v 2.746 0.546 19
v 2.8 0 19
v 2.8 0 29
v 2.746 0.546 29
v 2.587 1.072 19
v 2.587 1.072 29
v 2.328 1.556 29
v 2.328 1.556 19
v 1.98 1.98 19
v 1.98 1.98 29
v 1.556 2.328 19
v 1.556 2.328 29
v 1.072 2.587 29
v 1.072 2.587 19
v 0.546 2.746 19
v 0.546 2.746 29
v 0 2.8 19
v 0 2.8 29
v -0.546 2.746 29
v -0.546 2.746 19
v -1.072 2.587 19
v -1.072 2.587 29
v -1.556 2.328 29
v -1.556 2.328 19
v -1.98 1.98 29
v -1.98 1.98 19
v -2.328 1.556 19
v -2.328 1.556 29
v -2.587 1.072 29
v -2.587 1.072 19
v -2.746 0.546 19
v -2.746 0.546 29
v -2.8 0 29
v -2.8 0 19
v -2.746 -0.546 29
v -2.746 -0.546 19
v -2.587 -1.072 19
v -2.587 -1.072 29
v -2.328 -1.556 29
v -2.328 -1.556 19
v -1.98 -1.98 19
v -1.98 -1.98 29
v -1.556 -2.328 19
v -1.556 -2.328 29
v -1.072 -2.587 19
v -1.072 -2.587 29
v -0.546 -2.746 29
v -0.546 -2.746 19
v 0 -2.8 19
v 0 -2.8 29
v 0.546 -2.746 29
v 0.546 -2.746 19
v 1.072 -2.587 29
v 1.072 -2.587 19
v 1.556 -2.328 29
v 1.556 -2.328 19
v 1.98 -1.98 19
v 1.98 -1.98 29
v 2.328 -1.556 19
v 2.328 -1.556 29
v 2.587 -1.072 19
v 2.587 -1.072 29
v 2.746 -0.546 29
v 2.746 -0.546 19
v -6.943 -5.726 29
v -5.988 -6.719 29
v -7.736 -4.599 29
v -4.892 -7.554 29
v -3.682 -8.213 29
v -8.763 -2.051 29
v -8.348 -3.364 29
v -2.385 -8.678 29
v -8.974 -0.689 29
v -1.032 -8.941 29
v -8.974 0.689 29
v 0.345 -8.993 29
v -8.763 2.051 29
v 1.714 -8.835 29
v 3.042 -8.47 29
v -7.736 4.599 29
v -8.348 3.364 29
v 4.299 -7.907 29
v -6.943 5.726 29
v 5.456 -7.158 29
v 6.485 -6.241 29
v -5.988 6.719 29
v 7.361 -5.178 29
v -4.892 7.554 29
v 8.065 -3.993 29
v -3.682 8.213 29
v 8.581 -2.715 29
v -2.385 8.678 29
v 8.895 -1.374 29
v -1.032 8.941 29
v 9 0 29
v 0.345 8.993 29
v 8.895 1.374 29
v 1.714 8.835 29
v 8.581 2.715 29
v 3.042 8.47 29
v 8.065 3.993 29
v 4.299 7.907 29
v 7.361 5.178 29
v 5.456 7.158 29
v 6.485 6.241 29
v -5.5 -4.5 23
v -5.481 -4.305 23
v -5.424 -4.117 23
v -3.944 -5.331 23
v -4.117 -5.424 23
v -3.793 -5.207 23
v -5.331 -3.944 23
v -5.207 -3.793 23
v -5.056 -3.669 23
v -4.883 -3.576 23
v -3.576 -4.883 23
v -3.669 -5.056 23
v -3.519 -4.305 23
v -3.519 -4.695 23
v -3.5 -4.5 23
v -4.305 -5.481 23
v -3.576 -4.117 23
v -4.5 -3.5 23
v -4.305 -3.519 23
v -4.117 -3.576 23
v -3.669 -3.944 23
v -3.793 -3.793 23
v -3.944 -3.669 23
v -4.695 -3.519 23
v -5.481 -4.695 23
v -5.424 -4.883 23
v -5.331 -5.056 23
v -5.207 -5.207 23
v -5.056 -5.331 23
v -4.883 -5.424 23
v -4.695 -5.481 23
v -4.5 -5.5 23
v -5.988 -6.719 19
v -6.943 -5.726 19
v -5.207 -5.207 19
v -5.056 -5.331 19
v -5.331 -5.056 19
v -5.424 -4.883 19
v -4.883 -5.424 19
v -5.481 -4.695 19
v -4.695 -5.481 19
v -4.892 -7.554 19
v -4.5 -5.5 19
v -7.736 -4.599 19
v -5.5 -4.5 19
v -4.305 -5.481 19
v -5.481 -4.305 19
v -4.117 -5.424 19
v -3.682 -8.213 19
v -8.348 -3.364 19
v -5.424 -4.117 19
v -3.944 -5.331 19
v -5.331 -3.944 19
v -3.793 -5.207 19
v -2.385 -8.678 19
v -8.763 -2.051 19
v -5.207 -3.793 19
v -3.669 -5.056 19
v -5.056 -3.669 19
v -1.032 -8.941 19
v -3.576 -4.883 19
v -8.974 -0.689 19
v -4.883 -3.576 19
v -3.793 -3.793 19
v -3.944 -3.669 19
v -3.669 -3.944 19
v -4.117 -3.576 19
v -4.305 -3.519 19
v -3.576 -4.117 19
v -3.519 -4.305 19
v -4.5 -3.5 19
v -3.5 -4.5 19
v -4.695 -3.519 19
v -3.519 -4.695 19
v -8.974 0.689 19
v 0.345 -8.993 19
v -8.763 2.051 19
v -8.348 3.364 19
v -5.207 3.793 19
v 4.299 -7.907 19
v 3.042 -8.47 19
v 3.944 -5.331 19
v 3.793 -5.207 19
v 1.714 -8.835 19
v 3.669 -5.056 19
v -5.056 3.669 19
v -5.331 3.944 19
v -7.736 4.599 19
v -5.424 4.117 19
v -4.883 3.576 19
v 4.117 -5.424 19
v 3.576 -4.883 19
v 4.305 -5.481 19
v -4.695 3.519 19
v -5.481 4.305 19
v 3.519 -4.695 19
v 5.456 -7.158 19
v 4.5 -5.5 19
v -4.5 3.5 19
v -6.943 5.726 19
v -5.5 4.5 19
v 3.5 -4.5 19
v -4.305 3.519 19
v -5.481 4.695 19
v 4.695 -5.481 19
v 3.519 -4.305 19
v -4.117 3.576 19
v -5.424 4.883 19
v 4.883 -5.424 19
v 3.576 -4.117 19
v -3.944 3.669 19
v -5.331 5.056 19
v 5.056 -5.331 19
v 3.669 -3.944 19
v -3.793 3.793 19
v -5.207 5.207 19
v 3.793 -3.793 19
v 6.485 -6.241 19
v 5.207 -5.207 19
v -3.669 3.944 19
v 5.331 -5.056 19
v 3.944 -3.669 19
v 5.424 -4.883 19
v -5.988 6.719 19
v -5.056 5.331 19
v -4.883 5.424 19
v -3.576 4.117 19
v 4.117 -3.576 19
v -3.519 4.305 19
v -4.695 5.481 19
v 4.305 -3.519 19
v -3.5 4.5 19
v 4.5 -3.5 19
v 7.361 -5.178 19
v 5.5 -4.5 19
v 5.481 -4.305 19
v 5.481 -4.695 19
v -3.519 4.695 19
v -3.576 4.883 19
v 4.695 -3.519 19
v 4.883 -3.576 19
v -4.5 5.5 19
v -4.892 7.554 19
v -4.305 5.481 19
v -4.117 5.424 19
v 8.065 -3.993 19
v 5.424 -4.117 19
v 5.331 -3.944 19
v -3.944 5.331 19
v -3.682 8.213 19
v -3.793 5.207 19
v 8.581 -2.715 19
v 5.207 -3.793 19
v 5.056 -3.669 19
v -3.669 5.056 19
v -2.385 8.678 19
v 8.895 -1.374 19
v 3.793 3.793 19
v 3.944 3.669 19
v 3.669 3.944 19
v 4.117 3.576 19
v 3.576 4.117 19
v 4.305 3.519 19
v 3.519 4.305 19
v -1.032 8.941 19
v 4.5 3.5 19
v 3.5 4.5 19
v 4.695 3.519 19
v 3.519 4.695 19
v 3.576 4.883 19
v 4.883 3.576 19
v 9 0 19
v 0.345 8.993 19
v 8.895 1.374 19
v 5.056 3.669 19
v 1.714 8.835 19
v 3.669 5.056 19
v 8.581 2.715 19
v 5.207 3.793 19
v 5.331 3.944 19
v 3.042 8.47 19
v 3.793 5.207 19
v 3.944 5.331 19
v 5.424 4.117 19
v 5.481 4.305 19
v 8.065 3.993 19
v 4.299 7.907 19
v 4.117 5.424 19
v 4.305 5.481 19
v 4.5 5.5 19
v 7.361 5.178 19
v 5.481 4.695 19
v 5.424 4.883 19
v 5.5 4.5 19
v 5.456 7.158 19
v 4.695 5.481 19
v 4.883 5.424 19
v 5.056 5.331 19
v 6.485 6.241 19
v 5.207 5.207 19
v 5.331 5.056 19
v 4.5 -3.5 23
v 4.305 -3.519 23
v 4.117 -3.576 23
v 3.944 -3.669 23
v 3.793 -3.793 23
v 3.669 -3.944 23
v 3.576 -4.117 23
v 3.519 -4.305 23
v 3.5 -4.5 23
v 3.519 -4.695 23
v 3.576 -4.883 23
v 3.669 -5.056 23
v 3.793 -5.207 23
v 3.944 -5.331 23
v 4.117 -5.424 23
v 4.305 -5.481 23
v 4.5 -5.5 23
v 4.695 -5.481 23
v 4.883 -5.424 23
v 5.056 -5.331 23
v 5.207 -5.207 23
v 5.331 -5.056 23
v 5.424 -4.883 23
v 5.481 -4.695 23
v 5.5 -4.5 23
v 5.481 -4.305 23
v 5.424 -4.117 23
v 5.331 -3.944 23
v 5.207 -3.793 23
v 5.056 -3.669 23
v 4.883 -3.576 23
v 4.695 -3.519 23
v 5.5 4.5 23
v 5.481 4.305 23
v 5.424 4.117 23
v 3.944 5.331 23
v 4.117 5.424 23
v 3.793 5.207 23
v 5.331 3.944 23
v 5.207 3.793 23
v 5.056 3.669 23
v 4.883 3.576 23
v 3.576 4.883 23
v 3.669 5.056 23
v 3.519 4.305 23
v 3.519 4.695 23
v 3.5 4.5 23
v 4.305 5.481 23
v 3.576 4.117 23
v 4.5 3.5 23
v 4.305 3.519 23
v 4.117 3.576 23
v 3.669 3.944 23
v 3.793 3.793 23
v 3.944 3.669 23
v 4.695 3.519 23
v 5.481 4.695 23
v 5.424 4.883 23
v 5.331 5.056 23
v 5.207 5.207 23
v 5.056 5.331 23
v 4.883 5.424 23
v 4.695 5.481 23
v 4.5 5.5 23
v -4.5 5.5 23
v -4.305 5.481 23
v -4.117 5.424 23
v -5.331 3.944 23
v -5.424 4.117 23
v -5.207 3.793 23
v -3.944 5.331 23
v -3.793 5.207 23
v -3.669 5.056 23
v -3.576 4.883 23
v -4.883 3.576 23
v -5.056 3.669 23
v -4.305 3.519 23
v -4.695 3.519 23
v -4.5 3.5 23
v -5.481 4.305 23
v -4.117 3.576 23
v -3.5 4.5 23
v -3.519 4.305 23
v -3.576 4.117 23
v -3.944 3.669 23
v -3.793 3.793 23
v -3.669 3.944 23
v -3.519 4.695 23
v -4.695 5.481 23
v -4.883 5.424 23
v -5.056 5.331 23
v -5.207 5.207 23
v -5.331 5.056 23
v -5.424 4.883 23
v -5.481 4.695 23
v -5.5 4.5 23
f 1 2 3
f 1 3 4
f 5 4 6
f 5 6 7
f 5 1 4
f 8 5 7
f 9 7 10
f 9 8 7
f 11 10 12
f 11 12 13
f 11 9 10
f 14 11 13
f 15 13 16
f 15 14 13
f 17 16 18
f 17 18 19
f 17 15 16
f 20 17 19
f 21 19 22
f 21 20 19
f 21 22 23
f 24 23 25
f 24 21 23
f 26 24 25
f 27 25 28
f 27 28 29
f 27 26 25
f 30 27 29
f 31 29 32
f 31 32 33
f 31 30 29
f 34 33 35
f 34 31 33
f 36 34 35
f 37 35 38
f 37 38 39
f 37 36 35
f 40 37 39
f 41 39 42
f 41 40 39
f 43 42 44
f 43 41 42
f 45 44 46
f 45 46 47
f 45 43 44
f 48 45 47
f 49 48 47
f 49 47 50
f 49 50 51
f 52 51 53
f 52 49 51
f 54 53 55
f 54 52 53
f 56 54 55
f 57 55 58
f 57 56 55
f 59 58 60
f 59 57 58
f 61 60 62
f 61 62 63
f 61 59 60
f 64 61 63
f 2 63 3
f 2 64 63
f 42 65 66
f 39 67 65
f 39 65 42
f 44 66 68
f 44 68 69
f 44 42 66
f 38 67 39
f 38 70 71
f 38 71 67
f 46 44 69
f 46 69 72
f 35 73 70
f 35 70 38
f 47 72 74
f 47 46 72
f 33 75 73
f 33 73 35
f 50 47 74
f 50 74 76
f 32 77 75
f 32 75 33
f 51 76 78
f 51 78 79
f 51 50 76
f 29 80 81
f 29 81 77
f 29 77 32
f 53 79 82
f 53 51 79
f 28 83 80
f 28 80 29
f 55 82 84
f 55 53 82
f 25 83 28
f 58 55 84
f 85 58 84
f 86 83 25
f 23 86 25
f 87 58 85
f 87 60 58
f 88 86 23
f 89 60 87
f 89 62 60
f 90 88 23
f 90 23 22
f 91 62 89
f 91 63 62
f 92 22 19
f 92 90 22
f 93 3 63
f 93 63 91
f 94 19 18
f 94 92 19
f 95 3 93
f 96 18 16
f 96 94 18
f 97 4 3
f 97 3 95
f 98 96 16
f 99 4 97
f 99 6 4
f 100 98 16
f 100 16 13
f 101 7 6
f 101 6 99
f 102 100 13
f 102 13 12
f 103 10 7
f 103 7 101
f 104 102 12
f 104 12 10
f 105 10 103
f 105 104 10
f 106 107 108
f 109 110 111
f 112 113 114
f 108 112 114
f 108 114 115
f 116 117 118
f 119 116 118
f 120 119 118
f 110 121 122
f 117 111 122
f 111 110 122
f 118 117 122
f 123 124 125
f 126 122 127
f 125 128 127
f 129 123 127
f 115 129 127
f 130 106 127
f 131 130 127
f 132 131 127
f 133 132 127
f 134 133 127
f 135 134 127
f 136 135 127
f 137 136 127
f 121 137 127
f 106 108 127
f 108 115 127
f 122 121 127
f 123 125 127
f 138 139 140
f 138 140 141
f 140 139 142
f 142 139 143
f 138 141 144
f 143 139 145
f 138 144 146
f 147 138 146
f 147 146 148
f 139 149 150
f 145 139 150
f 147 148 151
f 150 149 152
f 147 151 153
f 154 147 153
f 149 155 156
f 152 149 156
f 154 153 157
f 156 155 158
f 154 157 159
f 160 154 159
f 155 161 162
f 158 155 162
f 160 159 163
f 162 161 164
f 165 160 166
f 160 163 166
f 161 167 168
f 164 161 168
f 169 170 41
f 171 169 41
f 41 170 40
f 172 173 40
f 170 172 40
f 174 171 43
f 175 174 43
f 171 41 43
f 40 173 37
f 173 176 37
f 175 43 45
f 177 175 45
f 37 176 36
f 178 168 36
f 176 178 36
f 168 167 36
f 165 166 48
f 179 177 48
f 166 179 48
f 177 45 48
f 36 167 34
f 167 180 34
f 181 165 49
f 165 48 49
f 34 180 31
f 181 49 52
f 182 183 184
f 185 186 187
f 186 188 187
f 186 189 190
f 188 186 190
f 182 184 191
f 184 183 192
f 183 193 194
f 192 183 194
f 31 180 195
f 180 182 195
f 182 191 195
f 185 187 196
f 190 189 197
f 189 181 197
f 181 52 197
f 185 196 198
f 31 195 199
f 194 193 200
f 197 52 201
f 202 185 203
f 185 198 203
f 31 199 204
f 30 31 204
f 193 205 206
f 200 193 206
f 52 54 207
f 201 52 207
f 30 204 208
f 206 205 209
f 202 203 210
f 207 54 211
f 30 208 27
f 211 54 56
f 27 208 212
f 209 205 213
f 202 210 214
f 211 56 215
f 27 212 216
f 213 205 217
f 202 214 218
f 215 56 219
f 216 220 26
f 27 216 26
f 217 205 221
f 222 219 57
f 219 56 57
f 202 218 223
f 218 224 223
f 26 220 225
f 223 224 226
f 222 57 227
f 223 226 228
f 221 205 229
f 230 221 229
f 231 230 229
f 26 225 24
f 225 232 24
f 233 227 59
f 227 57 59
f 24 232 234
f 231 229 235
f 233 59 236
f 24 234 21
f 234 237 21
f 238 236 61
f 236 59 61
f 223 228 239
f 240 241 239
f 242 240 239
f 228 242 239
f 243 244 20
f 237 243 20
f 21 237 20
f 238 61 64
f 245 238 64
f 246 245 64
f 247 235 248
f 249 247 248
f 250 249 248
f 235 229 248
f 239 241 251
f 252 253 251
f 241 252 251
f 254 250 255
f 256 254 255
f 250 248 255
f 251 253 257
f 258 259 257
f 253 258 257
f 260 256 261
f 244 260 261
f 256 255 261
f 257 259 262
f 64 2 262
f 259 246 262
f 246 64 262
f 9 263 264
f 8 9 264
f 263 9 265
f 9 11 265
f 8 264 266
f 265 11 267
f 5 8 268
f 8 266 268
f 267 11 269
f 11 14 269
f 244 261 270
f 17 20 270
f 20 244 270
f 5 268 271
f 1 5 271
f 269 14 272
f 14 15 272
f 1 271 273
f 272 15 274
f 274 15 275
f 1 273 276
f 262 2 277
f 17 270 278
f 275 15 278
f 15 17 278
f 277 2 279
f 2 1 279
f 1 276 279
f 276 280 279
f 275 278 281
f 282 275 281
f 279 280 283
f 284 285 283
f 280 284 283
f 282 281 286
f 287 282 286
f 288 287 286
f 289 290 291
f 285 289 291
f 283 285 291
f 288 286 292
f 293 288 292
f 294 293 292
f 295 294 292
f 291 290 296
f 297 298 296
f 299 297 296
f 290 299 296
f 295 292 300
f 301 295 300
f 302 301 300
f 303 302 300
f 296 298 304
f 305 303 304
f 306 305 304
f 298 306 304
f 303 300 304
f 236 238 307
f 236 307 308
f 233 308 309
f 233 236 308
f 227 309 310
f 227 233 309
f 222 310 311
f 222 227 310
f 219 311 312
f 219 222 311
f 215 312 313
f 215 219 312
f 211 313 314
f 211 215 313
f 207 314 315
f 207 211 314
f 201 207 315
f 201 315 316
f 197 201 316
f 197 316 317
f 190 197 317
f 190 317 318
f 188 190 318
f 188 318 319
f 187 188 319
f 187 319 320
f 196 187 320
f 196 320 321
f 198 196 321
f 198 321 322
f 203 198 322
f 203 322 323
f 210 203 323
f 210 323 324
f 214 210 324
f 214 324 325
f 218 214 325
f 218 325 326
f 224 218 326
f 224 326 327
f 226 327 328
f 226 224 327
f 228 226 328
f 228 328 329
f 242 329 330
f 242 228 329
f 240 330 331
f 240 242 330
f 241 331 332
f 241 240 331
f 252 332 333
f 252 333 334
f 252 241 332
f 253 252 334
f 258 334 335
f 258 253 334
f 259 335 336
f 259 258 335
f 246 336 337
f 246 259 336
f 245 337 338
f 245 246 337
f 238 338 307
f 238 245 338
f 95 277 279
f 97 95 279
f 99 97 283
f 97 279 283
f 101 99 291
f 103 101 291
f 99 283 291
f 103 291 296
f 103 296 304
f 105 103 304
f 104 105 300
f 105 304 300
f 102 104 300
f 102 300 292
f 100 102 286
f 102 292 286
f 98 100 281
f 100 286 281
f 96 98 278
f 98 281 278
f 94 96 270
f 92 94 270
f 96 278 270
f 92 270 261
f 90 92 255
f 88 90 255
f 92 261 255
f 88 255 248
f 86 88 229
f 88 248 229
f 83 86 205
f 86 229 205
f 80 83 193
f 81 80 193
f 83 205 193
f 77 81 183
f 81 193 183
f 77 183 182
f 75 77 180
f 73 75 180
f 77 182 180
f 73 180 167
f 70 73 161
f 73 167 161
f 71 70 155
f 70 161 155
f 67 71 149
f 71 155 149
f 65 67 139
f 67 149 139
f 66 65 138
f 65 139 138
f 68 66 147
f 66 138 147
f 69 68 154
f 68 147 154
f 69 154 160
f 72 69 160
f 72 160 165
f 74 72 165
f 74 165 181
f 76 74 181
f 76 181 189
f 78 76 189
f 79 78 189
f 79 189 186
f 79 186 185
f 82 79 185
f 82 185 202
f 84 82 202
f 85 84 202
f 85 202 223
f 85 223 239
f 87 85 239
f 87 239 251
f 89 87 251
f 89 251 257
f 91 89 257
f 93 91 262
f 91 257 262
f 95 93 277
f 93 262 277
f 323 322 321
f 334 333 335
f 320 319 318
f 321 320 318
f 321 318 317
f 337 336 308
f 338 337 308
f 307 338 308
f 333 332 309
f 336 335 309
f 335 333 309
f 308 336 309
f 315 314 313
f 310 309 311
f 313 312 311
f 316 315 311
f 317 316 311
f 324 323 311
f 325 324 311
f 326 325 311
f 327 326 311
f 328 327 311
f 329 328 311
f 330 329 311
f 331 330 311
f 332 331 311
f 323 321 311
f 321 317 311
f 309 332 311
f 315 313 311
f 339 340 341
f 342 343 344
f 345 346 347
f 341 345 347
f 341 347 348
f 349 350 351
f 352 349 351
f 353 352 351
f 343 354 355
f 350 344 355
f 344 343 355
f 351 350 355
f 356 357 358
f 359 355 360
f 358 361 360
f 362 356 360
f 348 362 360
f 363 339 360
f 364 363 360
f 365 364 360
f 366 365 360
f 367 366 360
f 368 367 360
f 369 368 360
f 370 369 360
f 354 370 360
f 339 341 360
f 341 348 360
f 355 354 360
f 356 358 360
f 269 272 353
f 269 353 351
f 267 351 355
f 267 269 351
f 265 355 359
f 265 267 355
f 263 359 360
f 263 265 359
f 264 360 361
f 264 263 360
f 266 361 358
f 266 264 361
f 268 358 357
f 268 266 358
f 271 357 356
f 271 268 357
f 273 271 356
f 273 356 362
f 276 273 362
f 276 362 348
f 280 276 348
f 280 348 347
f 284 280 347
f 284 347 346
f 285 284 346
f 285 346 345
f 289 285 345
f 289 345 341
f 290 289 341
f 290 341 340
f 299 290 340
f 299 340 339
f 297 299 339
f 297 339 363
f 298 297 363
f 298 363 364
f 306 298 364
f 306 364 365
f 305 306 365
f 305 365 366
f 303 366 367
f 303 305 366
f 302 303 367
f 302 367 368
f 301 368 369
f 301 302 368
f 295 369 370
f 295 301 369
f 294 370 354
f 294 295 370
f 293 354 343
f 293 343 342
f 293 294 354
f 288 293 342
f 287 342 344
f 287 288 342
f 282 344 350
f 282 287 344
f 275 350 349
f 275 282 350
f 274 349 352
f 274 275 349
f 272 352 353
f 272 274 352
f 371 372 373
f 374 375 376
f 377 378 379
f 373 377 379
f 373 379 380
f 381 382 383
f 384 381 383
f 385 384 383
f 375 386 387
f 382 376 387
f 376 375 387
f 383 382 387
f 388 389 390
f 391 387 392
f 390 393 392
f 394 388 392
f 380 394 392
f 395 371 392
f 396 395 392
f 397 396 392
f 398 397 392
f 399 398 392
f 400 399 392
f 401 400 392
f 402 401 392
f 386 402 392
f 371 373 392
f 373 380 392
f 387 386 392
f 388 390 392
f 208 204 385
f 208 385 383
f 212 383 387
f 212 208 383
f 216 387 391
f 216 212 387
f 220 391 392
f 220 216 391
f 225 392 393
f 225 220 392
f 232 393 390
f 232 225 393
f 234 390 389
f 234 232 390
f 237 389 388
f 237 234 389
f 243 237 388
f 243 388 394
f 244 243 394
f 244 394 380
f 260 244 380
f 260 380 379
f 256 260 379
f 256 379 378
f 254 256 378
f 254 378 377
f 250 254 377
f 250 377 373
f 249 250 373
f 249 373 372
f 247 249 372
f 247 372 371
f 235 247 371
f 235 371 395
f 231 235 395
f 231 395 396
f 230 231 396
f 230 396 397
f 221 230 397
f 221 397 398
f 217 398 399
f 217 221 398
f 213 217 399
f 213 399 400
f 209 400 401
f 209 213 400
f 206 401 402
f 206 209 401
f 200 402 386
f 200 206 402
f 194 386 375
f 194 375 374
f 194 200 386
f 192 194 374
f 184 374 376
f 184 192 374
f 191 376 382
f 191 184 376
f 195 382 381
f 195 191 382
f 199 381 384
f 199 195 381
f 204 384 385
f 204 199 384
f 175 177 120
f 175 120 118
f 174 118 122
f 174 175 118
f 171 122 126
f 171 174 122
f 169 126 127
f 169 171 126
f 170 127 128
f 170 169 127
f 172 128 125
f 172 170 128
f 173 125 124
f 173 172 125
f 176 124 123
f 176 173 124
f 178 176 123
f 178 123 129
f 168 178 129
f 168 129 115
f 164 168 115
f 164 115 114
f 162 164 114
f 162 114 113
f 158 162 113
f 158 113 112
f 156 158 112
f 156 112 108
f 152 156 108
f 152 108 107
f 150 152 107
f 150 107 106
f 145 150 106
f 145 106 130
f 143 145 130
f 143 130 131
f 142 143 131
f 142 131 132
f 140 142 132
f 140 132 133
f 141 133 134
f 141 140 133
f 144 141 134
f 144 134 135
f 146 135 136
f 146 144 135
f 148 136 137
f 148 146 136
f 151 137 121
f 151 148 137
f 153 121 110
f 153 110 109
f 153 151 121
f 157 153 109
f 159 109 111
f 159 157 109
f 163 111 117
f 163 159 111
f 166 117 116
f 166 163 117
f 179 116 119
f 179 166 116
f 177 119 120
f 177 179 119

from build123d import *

# Parameters (mm, degrees)
CYLINDER980_R     = 1
CYLINDER980_DEPTH = 20
CYLINDER977_R     = 1
CYLINDER977_DEPTH = 20
CYLINDER976_R     = 1
CYLINDER976_DEPTH = 20
CYLINDER979_R     = 1
CYLINDER979_DEPTH = 20
TUBE092_R         = 9
TUBE092_R_2       = 2.8
TUBE092_DEPTH     = 10


with BuildPart() as v_lec980:
    # Cylinder980 → Cylinder980 (new body)
    with BuildSketch(Plane(origin=(4.5, -4.5, -88), x_dir=(0, 1, 0), z_dir=(0, 0, 1))):
        Circle(CYLINDER980_R)
    extrude(amount=CYLINDER980_DEPTH)


with BuildPart() as v_lec977:
    # Cylinder977 → Cylinder977 (new body)
    with BuildSketch(Plane(origin=(4.5, 4.5, -88), x_dir=(-1, 0, 0), z_dir=(0, 0, 1))):
        Circle(CYLINDER977_R)
    extrude(amount=CYLINDER977_DEPTH)


with BuildPart() as v_lec976:
    # Cylinder976 → Cylinder976 (new body)
    with BuildSketch(Plane(origin=(-4.5, 4.5, -88), x_dir=(0, -1, 0), z_dir=(0, 0, 1))):
        Circle(CYLINDER976_R)
    extrude(amount=CYLINDER976_DEPTH)


with BuildPart() as compound809:
    # Cylinder979 → Cylinder979 (new body)
    with BuildSketch(Plane(origin=(-4.5, -4.5, -88), x_dir=(1, 0, 0), z_dir=(0, 0, 1))):
        Circle(CYLINDER979_R)
    extrude(amount=CYLINDER979_DEPTH)

    # Compound809: union Válec980, Válec977, Válec976
    add(v_lec980.part)
    add(v_lec977.part)
    add(v_lec976.part)


with BuildPart() as compound809_1:
    # Compound809 placement: moved
    add(compound809.part.moved(Location((0, 0, 91))))


with BuildPart() as cut413:
    # Tube092 → Tube092 (new body)
    with BuildSketch(Plane.XY.offset(19)):
        Circle(TUBE092_R)
        Circle(TUBE092_R_2, mode=Mode.SUBTRACT)
    extrude(amount=TUBE092_DEPTH)

    # Cut413: cut Compound809
    add(compound809_1.part, mode=Mode.SUBTRACT)


solid = cut413.part
